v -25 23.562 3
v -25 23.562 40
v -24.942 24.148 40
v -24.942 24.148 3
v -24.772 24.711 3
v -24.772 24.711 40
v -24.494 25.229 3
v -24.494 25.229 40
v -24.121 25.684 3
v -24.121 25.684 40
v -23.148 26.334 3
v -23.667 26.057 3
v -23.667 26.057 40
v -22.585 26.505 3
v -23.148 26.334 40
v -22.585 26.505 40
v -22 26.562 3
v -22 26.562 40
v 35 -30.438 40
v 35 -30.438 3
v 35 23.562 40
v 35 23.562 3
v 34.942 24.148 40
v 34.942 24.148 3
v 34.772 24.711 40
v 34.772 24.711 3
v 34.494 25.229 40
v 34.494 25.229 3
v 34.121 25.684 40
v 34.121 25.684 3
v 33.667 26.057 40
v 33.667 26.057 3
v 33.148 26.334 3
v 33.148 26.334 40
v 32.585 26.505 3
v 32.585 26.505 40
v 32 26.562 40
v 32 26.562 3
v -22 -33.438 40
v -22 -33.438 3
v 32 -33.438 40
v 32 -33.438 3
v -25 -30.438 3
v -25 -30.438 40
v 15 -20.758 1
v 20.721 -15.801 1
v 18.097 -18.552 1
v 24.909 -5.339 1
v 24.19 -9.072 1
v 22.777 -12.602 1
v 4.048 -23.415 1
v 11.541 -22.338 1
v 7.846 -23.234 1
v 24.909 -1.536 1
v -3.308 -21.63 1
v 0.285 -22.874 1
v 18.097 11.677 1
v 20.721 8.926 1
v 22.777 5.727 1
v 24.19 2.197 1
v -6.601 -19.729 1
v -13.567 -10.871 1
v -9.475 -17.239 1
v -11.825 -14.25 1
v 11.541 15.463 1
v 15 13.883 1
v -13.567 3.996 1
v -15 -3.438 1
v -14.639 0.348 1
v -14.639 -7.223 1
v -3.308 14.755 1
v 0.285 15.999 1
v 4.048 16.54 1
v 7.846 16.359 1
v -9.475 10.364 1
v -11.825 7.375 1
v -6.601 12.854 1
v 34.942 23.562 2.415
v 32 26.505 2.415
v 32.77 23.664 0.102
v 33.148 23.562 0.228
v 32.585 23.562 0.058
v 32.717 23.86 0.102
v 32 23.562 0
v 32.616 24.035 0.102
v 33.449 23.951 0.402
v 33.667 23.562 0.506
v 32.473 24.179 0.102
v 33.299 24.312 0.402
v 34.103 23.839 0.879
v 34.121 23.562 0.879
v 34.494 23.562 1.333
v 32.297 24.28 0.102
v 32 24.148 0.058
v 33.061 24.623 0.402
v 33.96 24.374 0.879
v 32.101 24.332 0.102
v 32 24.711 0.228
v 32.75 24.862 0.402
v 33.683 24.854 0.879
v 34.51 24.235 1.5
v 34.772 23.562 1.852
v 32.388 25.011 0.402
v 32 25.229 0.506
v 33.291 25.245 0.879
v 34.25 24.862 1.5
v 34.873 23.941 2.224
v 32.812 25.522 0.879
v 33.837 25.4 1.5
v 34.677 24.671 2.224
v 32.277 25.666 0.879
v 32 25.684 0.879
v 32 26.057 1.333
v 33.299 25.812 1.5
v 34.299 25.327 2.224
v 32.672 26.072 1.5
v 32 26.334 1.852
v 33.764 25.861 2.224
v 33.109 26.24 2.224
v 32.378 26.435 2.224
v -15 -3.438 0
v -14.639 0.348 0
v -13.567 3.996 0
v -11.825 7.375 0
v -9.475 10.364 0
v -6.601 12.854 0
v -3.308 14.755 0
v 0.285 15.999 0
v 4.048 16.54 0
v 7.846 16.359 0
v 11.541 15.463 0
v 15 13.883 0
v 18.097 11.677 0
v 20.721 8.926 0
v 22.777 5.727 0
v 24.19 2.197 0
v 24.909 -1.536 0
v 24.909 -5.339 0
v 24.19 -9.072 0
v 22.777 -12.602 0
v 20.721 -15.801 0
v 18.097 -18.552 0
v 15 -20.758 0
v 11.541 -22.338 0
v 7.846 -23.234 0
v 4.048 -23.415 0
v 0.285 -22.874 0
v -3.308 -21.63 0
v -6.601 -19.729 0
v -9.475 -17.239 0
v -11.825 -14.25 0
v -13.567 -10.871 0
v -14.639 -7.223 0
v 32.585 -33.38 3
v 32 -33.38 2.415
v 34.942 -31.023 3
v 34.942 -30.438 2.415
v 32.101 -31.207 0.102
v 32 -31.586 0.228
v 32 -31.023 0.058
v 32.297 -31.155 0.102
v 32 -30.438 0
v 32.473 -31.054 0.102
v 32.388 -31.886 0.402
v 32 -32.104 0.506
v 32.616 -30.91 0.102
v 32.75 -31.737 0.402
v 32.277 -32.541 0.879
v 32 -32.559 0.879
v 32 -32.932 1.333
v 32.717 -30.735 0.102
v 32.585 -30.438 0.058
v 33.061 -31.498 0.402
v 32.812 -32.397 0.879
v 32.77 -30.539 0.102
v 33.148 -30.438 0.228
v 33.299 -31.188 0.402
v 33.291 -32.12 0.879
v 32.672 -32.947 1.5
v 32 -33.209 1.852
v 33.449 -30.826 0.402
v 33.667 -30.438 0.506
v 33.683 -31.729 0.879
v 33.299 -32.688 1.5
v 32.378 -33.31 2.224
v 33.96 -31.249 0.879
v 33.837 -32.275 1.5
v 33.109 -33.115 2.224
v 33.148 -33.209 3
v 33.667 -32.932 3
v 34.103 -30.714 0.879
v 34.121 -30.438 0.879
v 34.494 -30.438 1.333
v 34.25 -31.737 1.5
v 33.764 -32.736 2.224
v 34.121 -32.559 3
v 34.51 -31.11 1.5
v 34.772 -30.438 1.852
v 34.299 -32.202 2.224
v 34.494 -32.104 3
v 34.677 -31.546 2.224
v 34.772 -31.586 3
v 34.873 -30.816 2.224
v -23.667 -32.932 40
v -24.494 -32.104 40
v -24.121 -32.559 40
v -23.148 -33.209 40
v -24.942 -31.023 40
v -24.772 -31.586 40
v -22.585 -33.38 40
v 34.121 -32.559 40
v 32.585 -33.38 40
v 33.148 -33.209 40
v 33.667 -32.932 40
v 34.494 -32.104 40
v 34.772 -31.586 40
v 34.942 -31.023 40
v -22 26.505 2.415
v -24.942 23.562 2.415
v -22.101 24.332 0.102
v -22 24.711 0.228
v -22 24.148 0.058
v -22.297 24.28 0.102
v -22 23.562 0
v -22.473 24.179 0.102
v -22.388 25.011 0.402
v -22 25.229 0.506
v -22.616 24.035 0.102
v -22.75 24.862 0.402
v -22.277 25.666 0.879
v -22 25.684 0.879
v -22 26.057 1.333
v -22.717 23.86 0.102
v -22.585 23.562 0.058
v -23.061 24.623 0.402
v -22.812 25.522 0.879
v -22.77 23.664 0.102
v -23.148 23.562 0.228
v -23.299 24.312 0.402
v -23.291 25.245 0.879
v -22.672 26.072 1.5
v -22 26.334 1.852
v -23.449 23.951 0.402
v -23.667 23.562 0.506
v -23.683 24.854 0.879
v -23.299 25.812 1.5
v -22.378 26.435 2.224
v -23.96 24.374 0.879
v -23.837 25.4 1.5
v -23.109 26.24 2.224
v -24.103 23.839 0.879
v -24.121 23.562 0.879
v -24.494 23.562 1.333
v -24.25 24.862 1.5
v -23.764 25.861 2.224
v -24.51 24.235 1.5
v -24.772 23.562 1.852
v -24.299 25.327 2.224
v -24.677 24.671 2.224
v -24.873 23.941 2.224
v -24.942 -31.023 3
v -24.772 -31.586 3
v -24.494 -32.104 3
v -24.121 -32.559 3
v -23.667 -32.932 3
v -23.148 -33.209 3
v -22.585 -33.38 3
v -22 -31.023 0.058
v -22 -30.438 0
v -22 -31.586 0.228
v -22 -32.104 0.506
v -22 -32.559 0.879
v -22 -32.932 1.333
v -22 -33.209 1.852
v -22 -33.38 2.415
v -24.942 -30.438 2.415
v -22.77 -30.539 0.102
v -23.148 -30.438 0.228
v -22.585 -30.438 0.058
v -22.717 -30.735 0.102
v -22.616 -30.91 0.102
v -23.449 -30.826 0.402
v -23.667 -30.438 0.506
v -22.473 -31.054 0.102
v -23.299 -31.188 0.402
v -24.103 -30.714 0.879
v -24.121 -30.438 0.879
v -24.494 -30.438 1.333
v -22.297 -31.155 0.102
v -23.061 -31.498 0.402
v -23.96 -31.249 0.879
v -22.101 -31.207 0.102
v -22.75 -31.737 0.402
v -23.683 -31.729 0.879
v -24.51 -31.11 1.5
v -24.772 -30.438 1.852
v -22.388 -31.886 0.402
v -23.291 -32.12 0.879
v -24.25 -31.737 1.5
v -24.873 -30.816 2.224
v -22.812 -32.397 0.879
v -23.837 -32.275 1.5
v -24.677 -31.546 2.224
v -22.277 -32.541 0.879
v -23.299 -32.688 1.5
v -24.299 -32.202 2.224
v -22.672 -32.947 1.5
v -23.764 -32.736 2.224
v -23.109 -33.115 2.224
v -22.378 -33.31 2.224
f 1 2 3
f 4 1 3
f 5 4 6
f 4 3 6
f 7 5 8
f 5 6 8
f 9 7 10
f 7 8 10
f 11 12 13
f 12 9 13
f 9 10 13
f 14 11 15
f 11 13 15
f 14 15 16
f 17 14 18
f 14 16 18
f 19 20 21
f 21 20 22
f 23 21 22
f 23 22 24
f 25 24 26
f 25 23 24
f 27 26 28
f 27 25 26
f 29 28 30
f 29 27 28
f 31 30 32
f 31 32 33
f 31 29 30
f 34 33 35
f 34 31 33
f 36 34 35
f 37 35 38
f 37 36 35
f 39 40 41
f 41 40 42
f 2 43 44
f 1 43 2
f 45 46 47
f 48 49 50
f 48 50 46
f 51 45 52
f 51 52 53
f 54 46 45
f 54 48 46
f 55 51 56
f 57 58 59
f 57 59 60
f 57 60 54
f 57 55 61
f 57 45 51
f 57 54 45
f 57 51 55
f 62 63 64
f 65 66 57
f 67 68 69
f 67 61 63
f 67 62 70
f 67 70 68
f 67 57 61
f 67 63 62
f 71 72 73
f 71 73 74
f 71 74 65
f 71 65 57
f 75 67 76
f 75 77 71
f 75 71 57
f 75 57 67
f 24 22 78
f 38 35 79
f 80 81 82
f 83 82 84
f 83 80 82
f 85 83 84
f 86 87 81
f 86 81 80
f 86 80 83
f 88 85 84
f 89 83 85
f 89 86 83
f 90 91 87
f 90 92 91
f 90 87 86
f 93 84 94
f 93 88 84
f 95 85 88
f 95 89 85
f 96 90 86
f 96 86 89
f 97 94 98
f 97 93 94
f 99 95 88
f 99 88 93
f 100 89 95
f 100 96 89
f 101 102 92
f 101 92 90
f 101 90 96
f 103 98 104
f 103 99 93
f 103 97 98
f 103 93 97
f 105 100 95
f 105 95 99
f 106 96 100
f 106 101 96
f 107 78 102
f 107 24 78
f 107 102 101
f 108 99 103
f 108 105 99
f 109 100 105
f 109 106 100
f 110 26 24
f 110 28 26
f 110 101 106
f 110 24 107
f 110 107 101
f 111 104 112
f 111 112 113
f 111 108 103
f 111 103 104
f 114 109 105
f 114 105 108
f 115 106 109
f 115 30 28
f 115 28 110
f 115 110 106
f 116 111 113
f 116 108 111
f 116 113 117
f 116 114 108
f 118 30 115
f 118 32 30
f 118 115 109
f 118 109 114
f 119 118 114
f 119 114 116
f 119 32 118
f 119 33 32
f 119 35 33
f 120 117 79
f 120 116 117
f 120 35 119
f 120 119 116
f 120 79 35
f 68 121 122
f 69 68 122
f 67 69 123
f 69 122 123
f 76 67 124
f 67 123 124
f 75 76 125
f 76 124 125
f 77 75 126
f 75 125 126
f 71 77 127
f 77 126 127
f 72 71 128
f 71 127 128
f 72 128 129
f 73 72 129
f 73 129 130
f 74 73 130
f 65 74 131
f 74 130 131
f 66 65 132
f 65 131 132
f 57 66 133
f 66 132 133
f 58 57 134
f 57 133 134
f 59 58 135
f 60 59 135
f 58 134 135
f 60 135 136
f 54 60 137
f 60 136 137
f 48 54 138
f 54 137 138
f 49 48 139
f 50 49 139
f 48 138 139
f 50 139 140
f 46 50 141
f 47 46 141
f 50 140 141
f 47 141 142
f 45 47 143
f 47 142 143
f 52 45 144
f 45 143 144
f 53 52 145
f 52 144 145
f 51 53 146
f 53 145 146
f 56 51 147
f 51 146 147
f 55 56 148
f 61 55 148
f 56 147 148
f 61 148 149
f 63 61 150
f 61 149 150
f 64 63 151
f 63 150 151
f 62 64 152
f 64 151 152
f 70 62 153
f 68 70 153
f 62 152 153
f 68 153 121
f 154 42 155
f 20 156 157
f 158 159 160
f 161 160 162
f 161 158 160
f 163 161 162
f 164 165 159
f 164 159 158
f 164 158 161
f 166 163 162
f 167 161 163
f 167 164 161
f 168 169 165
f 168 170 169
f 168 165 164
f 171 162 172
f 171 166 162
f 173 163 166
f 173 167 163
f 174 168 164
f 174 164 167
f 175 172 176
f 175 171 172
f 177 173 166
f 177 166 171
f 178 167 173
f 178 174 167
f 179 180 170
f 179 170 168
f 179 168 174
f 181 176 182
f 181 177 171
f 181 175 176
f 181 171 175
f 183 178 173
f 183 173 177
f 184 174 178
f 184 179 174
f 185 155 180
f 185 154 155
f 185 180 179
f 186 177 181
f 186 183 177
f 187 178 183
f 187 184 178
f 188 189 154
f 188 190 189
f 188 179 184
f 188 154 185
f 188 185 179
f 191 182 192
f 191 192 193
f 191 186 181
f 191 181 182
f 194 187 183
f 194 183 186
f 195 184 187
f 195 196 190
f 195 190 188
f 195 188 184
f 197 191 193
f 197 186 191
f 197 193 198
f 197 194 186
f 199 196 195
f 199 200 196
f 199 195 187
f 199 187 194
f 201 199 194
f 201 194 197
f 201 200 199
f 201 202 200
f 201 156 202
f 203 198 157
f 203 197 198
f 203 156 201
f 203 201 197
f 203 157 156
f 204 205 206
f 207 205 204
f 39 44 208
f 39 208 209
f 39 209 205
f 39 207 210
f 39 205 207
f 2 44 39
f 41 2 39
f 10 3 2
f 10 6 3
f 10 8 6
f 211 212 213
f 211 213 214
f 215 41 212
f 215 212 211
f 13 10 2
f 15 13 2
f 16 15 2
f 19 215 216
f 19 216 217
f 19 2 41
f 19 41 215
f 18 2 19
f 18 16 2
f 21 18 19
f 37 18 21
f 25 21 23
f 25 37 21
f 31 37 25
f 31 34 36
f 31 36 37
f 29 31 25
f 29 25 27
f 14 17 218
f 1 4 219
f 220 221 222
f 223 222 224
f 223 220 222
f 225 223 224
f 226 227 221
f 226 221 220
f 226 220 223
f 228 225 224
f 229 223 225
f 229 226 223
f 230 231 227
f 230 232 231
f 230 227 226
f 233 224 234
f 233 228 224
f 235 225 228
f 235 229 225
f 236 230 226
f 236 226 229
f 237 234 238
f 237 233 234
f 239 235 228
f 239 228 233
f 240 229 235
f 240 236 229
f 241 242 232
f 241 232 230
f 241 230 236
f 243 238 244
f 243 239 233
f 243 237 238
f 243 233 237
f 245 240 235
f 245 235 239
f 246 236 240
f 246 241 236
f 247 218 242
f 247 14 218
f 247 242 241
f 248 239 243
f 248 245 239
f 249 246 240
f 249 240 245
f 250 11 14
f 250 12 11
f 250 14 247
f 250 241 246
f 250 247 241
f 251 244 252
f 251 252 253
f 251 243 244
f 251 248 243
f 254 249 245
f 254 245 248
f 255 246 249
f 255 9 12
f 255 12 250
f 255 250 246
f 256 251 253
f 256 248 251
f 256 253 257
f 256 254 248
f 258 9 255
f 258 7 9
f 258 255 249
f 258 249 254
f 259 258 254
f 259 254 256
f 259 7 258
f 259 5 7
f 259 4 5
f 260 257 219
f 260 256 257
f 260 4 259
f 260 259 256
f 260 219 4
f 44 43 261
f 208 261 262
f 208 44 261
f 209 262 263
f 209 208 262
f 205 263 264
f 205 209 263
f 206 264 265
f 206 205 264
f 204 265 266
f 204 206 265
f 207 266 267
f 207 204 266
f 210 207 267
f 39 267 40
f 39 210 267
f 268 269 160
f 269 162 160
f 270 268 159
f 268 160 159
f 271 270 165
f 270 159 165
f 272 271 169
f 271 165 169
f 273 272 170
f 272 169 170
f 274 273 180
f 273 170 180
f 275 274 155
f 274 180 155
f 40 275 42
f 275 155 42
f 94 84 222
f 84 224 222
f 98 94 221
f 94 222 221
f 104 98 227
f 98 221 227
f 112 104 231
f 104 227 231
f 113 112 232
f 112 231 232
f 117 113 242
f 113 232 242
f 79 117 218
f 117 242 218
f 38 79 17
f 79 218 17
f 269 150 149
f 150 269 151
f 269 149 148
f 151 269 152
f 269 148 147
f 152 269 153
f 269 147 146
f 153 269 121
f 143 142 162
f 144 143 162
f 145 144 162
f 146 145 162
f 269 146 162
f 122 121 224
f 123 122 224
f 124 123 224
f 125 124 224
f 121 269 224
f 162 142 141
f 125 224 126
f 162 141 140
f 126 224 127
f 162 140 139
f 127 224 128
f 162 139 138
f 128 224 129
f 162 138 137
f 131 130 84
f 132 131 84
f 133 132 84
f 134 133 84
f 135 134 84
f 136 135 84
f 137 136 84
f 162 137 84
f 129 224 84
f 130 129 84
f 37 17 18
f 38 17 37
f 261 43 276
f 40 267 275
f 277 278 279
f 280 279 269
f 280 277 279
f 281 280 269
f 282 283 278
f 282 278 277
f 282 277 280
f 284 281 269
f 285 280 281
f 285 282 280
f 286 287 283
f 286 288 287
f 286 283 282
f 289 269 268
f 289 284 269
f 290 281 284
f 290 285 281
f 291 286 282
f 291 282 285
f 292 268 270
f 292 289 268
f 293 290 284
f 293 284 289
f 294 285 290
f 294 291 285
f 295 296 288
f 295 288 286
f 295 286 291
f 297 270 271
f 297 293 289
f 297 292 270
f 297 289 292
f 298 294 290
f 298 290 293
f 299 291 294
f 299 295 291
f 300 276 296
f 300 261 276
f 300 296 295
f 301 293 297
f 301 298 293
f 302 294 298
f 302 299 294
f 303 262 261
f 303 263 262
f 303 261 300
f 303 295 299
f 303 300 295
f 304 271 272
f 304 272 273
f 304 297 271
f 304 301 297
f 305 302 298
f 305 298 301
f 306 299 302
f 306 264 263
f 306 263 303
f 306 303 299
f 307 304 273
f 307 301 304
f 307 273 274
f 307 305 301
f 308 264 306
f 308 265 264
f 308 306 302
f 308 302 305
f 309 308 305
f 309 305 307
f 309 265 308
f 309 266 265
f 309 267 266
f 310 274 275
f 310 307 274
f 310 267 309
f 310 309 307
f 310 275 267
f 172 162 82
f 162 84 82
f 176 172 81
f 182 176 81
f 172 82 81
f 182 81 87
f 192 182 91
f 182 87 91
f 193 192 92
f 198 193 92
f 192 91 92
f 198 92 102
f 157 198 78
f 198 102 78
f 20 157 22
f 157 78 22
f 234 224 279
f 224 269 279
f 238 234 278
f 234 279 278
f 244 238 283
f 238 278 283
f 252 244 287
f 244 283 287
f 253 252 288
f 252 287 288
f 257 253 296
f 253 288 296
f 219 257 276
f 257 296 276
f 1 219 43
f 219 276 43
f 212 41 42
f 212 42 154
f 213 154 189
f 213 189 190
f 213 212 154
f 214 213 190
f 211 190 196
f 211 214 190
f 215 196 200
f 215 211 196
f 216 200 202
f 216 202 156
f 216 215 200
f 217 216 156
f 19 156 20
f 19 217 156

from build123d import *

# Parameters (mm, degrees)
SKETCH1_W           = 60
SKETCH1_H           = 60
BOSS_EXTRUDE1_DEPTH = 40
FILLET1_R           = 3
FILLET2_R           = 3
SKETCH2_R           = 20
CUT_EXTRUDE1_DEPTH  = 1


with BuildPart() as part:
    # Sketch1 → Boss-Extrude1 (new body)
    with BuildSketch(Plane.XY):
        with Locations((5, -3.4375)):
            Rectangle(SKETCH1_W, SKETCH1_H)
    extrude(amount=BOSS_EXTRUDE1_DEPTH)

    # Fillet1
    fillet1_edges = [part.edges().sort_by_distance(p)[0] for p in [
        (-25, 26.5625, 20),
        (35, 26.5625, 20),
        (35, -33.4375, 20),
        (-25, -33.4375, 20),
    ]]
    fillet(fillet1_edges, radius=FILLET1_R)

    # Fillet2
    fillet2_edges = [part.edges().sort_by_distance(p)[0] for p in [
        (35, -3.4375, 0),
        (-25, -3.4375, 0),
        (5, 26.5625, 0),
        (5, -33.4375, 0),
        (34.121320344, 25.683820344, 0),
        (-24.121320344, 25.683820344, 0),
        (-24.121320344, -32.558820344, 0),
        (34.121320344, -32.558820344, 0),
    ]]
    fillet(fillet2_edges, radius=FILLET2_R)

    # Sketch2 → Cut-Extrude1 (cut)
    with BuildSketch(Plane(origin=(0, 0, 0), x_dir=(-1, 0, 0), z_dir=(0, 0, -1))):
        with Locations((-5, -3.4375)):
            Circle(SKETCH2_R)
    extrude(amount=-CUT_EXTRUDE1_DEPTH, mode=Mode.SUBTRACT)


solid = part.part
